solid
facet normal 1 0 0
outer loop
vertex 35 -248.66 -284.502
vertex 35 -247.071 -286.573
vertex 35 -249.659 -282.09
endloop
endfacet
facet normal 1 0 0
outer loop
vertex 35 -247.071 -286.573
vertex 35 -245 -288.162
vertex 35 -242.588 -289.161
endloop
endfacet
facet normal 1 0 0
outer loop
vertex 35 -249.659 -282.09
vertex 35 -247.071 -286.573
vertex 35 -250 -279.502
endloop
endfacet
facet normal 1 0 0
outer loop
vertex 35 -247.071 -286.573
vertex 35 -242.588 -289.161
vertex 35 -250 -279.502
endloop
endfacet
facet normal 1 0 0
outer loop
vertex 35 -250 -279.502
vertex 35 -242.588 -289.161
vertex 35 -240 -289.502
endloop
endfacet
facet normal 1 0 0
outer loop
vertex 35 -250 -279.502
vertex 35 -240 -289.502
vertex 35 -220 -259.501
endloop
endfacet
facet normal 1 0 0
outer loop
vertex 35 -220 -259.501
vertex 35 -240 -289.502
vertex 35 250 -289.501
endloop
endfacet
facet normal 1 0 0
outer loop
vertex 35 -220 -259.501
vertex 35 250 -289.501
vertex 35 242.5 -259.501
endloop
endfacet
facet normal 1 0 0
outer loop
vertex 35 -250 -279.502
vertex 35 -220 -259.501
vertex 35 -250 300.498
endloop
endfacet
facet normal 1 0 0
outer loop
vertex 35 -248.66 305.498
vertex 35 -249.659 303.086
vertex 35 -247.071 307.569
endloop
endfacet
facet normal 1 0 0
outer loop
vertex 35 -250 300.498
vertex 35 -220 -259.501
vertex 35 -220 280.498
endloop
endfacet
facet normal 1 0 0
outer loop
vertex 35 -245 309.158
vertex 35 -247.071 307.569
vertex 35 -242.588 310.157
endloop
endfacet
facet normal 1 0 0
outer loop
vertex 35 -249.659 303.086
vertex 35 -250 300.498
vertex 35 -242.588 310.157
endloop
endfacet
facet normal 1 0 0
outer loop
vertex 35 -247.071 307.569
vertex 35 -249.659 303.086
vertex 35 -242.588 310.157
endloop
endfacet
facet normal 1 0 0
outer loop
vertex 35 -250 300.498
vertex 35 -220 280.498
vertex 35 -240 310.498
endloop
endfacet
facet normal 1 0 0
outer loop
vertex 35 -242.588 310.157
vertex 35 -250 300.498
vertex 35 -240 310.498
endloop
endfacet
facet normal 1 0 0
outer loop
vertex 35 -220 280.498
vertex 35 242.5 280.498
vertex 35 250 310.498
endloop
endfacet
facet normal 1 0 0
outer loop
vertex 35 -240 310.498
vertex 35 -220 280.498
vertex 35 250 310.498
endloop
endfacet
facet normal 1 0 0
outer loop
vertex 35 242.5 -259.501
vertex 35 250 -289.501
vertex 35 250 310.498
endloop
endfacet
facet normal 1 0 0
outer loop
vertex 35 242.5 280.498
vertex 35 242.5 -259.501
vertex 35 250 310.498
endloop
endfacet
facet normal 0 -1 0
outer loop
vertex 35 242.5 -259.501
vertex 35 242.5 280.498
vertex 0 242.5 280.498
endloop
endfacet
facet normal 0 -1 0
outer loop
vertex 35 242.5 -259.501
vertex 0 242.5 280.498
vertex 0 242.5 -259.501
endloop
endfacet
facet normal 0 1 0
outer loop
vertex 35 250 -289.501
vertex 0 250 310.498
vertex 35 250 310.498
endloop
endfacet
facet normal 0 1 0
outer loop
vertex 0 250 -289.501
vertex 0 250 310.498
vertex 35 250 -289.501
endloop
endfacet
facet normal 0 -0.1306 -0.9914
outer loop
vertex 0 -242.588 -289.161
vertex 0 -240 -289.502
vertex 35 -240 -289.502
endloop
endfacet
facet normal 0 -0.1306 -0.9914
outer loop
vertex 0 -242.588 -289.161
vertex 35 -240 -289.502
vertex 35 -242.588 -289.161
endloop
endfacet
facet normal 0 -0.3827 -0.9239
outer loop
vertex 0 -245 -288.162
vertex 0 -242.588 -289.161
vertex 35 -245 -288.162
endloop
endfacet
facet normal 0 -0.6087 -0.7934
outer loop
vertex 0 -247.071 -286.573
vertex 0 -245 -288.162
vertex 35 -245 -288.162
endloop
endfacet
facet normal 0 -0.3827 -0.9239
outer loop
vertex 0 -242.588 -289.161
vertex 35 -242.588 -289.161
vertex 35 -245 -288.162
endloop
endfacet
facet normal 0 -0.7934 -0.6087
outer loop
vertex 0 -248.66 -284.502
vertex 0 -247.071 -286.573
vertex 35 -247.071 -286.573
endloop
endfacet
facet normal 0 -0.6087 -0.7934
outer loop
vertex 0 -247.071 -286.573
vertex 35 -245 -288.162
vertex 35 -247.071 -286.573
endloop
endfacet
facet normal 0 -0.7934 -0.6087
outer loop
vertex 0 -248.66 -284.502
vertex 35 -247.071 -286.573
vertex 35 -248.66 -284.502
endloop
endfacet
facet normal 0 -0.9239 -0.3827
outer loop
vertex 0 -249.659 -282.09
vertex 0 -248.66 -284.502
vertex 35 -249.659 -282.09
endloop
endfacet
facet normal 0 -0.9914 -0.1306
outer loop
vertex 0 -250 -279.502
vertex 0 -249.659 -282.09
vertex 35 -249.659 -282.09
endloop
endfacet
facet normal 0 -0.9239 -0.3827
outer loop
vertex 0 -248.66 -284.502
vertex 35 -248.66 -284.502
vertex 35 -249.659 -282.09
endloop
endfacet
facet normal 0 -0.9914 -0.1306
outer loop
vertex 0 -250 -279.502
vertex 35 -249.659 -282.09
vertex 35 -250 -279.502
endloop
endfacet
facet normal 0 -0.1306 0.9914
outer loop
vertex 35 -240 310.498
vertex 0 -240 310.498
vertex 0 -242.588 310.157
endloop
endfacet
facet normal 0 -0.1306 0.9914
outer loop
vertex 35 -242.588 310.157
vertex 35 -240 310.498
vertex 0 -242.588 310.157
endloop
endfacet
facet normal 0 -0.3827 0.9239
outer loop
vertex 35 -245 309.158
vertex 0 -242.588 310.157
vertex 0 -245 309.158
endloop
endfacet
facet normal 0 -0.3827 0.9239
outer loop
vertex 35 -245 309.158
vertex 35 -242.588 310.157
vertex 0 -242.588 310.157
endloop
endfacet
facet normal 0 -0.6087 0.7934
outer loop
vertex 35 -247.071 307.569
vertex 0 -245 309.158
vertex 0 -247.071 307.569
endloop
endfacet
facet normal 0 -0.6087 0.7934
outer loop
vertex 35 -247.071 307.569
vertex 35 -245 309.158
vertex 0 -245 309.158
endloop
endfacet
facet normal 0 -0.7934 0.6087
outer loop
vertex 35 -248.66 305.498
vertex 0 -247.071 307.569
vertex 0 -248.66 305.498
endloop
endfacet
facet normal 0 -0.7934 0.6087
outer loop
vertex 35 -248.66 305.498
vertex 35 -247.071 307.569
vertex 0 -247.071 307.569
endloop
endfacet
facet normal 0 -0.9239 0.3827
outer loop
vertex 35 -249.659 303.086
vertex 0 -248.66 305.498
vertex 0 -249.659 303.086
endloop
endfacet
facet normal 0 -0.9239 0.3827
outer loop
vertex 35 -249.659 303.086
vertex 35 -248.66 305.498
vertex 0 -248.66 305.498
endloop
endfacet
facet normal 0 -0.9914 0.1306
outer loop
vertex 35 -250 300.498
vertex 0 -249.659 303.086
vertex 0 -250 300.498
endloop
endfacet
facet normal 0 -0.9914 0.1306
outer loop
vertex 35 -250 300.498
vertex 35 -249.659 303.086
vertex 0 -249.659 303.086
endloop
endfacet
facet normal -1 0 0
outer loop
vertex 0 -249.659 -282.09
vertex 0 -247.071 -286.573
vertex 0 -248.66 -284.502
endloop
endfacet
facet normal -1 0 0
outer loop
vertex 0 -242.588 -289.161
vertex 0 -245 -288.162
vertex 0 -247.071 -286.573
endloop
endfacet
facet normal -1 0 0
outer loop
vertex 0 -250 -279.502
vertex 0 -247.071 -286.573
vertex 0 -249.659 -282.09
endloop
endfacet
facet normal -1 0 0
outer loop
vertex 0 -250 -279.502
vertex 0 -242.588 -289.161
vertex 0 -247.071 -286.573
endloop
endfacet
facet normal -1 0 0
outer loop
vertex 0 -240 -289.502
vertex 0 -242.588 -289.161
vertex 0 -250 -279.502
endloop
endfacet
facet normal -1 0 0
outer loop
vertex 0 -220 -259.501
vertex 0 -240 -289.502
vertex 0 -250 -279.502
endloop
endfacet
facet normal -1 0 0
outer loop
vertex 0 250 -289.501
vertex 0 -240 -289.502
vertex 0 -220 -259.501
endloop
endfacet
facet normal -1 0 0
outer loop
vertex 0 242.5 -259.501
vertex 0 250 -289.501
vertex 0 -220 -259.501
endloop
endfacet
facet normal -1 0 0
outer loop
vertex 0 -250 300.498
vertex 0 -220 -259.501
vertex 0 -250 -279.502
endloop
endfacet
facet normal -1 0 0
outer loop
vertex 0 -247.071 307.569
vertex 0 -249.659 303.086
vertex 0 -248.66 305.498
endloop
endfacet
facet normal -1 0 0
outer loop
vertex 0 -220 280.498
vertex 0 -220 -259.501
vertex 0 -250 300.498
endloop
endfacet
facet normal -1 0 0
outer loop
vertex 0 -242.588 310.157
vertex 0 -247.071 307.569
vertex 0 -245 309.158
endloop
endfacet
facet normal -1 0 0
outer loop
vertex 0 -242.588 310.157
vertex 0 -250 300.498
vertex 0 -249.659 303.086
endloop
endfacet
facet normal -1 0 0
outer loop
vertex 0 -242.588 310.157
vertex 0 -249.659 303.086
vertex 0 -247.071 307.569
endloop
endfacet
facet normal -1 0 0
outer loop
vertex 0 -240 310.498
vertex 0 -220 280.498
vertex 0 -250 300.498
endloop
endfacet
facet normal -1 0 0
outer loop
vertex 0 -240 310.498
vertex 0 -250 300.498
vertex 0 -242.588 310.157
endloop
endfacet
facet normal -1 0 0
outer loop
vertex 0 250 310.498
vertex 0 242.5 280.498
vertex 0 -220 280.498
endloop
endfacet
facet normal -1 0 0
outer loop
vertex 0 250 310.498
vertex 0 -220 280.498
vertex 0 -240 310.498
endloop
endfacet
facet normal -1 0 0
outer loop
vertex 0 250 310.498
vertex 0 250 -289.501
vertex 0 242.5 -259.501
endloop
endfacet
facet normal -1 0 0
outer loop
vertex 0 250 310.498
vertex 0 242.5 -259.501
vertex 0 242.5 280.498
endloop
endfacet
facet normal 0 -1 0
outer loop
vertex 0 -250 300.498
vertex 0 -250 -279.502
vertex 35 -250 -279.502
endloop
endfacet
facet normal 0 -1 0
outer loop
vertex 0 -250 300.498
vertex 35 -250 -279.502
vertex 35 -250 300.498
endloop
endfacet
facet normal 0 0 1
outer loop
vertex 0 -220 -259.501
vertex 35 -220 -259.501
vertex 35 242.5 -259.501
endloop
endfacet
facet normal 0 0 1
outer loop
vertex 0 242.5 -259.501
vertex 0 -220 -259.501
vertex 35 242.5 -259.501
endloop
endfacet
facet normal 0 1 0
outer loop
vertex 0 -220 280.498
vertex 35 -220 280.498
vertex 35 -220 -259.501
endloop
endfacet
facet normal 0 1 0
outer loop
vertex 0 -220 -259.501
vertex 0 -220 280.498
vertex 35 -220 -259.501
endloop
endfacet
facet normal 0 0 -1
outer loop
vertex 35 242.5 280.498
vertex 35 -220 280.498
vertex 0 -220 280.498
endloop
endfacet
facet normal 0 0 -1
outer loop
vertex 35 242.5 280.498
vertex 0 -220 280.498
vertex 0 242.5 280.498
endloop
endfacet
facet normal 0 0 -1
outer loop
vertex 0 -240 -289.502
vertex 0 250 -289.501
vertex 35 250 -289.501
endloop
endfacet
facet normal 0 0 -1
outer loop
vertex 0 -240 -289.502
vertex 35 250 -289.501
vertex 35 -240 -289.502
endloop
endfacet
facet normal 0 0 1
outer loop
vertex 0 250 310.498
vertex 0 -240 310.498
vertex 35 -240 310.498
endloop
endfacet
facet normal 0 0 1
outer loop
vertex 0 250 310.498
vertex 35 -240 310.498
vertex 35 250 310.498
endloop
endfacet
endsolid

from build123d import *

# Parameters (mm, degrees)
BOSS_EXTRUDE1_DEPTH = 35
SKETCH2_W           = 539.999711362
SKETCH2_H           = 462.5
CUT_EXTRUDE1_DEPTH  = 35
FILLET1_R           = 10


with BuildPart() as part:
    # Sketch1 → Boss-Extrude1 (new body)
    with BuildSketch(Plane(origin=(0, 0, 0), x_dir=(0, 0, -1), z_dir=(1, 0, 0))):
        Polygon((-310.498220641, 250), (289.501486325, 250), (289.501779359, -250), (-310.498220641, -250), align=None)
    extrude(amount=BOSS_EXTRUDE1_DEPTH)

    # Sketch2 → Cut-Extrude1 (cut)
    with BuildSketch(Plane(origin=(35, 0, 0), x_dir=(0, 0, -1), z_dir=(1, 0, 0))):
        with Locations((-10.49836496, 11.25)):
            Rectangle(SKETCH2_W, SKETCH2_H)
    extrude(amount=-CUT_EXTRUDE1_DEPTH, mode=Mode.SUBTRACT)

    # Fillet1
    fillet1_edges = [part.edges().sort_by_distance(p)[0] for p in [
        (17.5, -250, -289.501779359),
        (17.5, -250, 310.498220641),
    ]]
    fillet(fillet1_edges, radius=FILLET1_R)


solid = part.part
